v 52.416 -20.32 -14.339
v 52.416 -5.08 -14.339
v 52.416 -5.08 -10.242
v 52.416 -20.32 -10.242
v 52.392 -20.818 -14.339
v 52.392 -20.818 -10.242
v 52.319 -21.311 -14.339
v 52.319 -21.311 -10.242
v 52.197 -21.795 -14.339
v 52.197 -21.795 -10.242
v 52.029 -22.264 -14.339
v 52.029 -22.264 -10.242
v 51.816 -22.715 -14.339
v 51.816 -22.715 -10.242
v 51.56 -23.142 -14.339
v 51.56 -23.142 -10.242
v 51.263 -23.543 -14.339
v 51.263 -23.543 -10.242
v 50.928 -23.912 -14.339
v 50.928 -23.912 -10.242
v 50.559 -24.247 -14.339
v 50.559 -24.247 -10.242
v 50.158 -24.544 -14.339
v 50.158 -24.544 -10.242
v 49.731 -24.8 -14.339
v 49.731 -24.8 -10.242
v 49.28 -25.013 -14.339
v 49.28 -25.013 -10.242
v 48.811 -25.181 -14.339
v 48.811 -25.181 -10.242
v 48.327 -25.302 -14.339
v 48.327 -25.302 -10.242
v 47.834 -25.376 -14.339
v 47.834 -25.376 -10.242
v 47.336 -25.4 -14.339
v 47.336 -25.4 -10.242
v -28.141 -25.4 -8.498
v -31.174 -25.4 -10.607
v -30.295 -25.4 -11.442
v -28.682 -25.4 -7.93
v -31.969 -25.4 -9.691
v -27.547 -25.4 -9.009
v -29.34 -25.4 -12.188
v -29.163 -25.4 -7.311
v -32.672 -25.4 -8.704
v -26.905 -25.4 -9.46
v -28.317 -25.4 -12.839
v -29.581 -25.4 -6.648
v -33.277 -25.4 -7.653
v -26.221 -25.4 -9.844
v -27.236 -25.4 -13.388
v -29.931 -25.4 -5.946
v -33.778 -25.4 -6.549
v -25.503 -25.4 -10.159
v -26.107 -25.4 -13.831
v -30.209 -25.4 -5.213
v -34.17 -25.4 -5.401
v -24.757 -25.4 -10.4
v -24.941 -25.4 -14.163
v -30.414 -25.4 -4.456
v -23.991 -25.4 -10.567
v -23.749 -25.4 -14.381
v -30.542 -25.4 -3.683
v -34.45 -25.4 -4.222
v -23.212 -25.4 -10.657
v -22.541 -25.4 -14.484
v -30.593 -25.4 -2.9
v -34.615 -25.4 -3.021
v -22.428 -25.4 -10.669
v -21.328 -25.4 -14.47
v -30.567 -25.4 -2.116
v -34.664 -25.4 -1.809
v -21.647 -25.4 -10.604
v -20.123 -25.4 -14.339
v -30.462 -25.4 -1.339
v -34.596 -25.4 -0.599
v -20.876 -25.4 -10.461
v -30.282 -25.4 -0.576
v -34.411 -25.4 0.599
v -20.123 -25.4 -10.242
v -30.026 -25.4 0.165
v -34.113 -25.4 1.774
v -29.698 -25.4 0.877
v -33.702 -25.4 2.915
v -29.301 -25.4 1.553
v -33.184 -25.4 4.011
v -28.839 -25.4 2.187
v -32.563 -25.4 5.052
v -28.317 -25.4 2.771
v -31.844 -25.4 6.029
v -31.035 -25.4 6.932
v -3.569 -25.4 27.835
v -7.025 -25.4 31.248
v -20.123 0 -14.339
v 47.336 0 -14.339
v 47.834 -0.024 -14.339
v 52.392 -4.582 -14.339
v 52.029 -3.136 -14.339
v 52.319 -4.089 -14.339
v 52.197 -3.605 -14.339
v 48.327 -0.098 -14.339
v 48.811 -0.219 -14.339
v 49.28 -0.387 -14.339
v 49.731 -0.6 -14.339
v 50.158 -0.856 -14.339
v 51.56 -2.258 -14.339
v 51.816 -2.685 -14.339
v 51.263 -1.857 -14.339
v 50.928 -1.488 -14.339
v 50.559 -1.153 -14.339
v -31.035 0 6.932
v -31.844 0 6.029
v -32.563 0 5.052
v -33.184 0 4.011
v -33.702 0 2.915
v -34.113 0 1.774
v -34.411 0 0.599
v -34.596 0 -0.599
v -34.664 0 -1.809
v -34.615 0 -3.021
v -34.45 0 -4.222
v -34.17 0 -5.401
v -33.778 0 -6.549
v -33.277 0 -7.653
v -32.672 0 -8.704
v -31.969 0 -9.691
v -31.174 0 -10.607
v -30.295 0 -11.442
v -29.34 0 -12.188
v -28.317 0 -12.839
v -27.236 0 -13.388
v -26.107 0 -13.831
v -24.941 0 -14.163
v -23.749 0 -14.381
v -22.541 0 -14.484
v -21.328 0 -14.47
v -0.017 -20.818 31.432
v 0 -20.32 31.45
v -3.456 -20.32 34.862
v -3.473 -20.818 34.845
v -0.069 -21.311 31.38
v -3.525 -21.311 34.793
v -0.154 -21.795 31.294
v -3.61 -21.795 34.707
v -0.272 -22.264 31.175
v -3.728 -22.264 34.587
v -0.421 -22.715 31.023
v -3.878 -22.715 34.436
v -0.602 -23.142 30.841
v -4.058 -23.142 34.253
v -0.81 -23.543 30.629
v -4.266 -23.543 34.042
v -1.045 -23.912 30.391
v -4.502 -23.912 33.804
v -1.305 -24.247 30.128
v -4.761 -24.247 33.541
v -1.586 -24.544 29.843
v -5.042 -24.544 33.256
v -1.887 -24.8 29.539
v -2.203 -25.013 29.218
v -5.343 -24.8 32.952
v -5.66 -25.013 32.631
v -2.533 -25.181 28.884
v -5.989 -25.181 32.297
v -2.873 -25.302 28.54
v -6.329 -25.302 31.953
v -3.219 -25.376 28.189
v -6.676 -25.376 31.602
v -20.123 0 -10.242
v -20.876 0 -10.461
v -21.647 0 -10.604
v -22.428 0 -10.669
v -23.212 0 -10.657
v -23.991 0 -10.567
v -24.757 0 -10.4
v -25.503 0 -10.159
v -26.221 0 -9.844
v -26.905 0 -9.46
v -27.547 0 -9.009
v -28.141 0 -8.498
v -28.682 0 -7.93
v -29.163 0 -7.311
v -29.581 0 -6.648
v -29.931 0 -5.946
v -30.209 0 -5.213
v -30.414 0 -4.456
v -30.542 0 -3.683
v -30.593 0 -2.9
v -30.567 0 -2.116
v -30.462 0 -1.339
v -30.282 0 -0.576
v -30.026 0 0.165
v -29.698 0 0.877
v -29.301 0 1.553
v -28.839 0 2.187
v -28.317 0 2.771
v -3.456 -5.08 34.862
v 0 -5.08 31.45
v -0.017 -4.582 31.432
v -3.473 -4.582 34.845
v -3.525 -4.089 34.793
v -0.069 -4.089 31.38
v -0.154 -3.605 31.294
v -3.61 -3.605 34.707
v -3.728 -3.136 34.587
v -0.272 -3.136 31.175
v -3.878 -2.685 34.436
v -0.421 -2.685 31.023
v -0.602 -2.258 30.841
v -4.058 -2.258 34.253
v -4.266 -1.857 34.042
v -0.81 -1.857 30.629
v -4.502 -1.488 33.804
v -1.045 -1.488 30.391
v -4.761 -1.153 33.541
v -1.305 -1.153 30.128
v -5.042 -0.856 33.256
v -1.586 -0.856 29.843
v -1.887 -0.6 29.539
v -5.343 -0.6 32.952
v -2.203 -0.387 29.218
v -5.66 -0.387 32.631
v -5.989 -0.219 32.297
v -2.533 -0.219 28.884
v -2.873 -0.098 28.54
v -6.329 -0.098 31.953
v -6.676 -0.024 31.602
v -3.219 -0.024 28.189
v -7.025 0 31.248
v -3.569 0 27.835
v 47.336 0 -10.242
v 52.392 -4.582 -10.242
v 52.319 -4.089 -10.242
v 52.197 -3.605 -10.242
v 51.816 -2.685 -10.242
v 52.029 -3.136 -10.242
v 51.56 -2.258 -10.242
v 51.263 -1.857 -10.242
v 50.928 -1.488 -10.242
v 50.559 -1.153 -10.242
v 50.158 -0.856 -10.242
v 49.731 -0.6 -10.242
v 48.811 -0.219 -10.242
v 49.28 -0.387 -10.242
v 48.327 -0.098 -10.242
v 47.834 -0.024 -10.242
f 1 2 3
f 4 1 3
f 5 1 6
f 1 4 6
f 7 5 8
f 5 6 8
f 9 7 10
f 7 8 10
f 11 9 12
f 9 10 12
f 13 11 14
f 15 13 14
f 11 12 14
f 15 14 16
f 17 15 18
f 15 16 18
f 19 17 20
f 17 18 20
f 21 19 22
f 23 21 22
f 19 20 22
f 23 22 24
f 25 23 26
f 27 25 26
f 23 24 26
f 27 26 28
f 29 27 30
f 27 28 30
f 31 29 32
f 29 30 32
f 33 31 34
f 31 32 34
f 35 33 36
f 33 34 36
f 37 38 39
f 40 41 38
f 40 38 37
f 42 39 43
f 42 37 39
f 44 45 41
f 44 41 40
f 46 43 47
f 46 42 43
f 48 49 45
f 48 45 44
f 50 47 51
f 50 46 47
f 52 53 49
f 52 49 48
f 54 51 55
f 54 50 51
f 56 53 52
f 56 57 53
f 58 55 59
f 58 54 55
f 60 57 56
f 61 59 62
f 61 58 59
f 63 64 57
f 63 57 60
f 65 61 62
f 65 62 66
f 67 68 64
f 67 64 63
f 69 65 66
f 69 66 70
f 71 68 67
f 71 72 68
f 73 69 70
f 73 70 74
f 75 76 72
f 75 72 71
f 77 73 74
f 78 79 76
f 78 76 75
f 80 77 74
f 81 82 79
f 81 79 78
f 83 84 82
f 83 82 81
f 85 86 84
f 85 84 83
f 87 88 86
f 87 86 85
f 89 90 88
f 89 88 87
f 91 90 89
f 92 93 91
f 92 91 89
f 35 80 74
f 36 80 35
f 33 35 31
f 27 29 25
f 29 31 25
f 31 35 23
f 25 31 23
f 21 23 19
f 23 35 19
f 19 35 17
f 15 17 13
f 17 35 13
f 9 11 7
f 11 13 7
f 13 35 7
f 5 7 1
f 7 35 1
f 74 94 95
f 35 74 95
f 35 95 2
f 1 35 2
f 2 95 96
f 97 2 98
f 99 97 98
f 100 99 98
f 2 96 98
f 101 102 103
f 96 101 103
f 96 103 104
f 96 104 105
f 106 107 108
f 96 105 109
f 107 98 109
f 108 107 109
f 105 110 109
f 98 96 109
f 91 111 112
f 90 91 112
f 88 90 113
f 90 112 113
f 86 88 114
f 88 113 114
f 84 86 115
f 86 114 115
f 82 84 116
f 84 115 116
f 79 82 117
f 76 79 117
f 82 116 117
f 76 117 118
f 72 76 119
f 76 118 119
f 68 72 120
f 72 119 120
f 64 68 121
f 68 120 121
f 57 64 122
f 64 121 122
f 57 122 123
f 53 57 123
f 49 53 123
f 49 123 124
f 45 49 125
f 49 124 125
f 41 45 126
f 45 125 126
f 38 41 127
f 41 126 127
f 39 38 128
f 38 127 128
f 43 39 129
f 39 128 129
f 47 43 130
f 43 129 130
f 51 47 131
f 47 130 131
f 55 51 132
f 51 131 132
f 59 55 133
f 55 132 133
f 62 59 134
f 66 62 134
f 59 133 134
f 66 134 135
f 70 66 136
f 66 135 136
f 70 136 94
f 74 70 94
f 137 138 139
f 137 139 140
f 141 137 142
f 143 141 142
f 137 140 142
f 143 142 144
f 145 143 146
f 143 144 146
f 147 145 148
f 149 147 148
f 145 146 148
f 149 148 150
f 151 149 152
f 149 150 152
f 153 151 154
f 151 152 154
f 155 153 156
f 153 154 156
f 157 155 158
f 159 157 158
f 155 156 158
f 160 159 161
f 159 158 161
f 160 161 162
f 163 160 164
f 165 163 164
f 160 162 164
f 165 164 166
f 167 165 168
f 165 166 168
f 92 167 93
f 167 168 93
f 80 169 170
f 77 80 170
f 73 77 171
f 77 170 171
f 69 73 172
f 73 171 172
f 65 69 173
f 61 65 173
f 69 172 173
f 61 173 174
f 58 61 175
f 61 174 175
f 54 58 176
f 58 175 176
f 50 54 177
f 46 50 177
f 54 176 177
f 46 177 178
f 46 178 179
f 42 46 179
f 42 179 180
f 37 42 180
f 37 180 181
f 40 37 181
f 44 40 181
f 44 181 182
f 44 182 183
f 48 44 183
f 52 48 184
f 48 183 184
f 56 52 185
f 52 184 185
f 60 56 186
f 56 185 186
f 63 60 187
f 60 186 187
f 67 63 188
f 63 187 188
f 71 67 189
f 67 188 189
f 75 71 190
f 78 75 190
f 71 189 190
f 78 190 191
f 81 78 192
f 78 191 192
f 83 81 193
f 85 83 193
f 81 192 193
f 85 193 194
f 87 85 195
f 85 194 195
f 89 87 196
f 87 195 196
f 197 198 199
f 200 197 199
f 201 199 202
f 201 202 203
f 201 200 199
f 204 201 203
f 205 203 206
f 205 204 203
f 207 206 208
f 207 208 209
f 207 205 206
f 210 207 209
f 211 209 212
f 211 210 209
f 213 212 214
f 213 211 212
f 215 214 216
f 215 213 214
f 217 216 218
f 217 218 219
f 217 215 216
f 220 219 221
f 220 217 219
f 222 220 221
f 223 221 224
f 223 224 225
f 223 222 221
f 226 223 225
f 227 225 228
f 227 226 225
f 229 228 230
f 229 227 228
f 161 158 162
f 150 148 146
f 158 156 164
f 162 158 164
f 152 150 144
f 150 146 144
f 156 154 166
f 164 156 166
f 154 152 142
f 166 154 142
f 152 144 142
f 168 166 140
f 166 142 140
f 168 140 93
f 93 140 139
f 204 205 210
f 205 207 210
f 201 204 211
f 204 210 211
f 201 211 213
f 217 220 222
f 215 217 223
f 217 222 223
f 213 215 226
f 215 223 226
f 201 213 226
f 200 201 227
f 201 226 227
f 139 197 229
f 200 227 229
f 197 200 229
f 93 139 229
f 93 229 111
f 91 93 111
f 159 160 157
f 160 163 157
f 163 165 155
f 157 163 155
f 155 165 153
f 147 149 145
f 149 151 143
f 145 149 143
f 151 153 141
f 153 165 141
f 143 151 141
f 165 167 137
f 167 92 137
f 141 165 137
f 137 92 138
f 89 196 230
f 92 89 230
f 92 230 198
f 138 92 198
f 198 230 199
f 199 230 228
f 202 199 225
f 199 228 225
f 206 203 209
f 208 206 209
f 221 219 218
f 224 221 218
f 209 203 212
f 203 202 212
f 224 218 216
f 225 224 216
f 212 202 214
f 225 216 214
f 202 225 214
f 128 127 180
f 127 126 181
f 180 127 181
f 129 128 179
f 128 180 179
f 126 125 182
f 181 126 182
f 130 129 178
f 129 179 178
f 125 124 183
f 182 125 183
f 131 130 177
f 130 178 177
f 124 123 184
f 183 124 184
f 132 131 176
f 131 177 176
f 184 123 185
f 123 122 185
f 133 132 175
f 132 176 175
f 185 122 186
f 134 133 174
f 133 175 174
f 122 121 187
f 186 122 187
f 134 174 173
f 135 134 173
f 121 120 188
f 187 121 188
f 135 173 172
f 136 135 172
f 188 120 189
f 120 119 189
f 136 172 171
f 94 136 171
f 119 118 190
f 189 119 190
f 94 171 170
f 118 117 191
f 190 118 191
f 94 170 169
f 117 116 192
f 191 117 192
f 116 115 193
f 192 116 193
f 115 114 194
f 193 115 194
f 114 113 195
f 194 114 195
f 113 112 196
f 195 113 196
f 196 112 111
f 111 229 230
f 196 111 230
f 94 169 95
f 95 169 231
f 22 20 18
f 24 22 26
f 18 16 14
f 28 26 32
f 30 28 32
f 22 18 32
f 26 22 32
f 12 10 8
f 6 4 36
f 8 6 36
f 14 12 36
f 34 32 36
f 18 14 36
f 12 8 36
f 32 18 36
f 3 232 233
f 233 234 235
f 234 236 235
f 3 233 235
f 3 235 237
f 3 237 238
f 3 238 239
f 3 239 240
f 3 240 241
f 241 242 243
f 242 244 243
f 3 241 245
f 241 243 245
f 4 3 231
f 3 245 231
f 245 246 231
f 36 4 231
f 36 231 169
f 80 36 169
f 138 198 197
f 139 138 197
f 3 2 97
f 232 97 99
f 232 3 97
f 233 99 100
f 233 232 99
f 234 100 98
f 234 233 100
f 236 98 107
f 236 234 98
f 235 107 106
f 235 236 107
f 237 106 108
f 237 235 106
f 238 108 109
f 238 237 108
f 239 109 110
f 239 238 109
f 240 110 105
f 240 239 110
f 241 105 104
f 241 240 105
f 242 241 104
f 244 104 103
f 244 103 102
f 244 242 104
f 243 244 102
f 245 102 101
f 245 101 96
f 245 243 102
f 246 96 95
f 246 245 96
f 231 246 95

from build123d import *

# Parameters (mm, degrees)
F1_DEPTH = 25.4
F2_R     = 5.08


with BuildPart() as f1:
    # F0 (on Front) → F1 (new body)
    with BuildSketch(Plane.XZ):
        with BuildLine():
            Line((-28.316792, 2.771431), (0, 31.449713))
            Line((0, 31.449713), (-3.456192, 34.862339))
            Line((-3.456192, 34.862339), (-31.034873, 6.93159))
            ThreePointArc((-31.034873, 6.93159), (-33.276866, -7.65281), (-20.122997, -14.339142))
            Line((-20.122997, -14.339142), (52.416187, -14.339142))
            Line((52.416187, -14.339142), (52.416187, -10.242244))
            Line((52.416187, -10.242244), (-20.122997, -10.242244))
            ThreePointArc((-20.122997, -10.242244), (-29.380141, -6.984451), (-28.316792, 2.771431))
        make_face()
    extrude(amount=F1_DEPTH)

    # F2
    f2_edges = [f1.edges().sort_by_distance(p)[0] for p in [
        (-1.728096, -25.4, 33.156026),
        (-1.728096, 0, 33.156026),
        (52.416187, -25.4, -12.290693),
        (52.416187, 0, -12.290693),
    ]]
    fillet(f2_edges, radius=F2_R)


solid = f1.part
